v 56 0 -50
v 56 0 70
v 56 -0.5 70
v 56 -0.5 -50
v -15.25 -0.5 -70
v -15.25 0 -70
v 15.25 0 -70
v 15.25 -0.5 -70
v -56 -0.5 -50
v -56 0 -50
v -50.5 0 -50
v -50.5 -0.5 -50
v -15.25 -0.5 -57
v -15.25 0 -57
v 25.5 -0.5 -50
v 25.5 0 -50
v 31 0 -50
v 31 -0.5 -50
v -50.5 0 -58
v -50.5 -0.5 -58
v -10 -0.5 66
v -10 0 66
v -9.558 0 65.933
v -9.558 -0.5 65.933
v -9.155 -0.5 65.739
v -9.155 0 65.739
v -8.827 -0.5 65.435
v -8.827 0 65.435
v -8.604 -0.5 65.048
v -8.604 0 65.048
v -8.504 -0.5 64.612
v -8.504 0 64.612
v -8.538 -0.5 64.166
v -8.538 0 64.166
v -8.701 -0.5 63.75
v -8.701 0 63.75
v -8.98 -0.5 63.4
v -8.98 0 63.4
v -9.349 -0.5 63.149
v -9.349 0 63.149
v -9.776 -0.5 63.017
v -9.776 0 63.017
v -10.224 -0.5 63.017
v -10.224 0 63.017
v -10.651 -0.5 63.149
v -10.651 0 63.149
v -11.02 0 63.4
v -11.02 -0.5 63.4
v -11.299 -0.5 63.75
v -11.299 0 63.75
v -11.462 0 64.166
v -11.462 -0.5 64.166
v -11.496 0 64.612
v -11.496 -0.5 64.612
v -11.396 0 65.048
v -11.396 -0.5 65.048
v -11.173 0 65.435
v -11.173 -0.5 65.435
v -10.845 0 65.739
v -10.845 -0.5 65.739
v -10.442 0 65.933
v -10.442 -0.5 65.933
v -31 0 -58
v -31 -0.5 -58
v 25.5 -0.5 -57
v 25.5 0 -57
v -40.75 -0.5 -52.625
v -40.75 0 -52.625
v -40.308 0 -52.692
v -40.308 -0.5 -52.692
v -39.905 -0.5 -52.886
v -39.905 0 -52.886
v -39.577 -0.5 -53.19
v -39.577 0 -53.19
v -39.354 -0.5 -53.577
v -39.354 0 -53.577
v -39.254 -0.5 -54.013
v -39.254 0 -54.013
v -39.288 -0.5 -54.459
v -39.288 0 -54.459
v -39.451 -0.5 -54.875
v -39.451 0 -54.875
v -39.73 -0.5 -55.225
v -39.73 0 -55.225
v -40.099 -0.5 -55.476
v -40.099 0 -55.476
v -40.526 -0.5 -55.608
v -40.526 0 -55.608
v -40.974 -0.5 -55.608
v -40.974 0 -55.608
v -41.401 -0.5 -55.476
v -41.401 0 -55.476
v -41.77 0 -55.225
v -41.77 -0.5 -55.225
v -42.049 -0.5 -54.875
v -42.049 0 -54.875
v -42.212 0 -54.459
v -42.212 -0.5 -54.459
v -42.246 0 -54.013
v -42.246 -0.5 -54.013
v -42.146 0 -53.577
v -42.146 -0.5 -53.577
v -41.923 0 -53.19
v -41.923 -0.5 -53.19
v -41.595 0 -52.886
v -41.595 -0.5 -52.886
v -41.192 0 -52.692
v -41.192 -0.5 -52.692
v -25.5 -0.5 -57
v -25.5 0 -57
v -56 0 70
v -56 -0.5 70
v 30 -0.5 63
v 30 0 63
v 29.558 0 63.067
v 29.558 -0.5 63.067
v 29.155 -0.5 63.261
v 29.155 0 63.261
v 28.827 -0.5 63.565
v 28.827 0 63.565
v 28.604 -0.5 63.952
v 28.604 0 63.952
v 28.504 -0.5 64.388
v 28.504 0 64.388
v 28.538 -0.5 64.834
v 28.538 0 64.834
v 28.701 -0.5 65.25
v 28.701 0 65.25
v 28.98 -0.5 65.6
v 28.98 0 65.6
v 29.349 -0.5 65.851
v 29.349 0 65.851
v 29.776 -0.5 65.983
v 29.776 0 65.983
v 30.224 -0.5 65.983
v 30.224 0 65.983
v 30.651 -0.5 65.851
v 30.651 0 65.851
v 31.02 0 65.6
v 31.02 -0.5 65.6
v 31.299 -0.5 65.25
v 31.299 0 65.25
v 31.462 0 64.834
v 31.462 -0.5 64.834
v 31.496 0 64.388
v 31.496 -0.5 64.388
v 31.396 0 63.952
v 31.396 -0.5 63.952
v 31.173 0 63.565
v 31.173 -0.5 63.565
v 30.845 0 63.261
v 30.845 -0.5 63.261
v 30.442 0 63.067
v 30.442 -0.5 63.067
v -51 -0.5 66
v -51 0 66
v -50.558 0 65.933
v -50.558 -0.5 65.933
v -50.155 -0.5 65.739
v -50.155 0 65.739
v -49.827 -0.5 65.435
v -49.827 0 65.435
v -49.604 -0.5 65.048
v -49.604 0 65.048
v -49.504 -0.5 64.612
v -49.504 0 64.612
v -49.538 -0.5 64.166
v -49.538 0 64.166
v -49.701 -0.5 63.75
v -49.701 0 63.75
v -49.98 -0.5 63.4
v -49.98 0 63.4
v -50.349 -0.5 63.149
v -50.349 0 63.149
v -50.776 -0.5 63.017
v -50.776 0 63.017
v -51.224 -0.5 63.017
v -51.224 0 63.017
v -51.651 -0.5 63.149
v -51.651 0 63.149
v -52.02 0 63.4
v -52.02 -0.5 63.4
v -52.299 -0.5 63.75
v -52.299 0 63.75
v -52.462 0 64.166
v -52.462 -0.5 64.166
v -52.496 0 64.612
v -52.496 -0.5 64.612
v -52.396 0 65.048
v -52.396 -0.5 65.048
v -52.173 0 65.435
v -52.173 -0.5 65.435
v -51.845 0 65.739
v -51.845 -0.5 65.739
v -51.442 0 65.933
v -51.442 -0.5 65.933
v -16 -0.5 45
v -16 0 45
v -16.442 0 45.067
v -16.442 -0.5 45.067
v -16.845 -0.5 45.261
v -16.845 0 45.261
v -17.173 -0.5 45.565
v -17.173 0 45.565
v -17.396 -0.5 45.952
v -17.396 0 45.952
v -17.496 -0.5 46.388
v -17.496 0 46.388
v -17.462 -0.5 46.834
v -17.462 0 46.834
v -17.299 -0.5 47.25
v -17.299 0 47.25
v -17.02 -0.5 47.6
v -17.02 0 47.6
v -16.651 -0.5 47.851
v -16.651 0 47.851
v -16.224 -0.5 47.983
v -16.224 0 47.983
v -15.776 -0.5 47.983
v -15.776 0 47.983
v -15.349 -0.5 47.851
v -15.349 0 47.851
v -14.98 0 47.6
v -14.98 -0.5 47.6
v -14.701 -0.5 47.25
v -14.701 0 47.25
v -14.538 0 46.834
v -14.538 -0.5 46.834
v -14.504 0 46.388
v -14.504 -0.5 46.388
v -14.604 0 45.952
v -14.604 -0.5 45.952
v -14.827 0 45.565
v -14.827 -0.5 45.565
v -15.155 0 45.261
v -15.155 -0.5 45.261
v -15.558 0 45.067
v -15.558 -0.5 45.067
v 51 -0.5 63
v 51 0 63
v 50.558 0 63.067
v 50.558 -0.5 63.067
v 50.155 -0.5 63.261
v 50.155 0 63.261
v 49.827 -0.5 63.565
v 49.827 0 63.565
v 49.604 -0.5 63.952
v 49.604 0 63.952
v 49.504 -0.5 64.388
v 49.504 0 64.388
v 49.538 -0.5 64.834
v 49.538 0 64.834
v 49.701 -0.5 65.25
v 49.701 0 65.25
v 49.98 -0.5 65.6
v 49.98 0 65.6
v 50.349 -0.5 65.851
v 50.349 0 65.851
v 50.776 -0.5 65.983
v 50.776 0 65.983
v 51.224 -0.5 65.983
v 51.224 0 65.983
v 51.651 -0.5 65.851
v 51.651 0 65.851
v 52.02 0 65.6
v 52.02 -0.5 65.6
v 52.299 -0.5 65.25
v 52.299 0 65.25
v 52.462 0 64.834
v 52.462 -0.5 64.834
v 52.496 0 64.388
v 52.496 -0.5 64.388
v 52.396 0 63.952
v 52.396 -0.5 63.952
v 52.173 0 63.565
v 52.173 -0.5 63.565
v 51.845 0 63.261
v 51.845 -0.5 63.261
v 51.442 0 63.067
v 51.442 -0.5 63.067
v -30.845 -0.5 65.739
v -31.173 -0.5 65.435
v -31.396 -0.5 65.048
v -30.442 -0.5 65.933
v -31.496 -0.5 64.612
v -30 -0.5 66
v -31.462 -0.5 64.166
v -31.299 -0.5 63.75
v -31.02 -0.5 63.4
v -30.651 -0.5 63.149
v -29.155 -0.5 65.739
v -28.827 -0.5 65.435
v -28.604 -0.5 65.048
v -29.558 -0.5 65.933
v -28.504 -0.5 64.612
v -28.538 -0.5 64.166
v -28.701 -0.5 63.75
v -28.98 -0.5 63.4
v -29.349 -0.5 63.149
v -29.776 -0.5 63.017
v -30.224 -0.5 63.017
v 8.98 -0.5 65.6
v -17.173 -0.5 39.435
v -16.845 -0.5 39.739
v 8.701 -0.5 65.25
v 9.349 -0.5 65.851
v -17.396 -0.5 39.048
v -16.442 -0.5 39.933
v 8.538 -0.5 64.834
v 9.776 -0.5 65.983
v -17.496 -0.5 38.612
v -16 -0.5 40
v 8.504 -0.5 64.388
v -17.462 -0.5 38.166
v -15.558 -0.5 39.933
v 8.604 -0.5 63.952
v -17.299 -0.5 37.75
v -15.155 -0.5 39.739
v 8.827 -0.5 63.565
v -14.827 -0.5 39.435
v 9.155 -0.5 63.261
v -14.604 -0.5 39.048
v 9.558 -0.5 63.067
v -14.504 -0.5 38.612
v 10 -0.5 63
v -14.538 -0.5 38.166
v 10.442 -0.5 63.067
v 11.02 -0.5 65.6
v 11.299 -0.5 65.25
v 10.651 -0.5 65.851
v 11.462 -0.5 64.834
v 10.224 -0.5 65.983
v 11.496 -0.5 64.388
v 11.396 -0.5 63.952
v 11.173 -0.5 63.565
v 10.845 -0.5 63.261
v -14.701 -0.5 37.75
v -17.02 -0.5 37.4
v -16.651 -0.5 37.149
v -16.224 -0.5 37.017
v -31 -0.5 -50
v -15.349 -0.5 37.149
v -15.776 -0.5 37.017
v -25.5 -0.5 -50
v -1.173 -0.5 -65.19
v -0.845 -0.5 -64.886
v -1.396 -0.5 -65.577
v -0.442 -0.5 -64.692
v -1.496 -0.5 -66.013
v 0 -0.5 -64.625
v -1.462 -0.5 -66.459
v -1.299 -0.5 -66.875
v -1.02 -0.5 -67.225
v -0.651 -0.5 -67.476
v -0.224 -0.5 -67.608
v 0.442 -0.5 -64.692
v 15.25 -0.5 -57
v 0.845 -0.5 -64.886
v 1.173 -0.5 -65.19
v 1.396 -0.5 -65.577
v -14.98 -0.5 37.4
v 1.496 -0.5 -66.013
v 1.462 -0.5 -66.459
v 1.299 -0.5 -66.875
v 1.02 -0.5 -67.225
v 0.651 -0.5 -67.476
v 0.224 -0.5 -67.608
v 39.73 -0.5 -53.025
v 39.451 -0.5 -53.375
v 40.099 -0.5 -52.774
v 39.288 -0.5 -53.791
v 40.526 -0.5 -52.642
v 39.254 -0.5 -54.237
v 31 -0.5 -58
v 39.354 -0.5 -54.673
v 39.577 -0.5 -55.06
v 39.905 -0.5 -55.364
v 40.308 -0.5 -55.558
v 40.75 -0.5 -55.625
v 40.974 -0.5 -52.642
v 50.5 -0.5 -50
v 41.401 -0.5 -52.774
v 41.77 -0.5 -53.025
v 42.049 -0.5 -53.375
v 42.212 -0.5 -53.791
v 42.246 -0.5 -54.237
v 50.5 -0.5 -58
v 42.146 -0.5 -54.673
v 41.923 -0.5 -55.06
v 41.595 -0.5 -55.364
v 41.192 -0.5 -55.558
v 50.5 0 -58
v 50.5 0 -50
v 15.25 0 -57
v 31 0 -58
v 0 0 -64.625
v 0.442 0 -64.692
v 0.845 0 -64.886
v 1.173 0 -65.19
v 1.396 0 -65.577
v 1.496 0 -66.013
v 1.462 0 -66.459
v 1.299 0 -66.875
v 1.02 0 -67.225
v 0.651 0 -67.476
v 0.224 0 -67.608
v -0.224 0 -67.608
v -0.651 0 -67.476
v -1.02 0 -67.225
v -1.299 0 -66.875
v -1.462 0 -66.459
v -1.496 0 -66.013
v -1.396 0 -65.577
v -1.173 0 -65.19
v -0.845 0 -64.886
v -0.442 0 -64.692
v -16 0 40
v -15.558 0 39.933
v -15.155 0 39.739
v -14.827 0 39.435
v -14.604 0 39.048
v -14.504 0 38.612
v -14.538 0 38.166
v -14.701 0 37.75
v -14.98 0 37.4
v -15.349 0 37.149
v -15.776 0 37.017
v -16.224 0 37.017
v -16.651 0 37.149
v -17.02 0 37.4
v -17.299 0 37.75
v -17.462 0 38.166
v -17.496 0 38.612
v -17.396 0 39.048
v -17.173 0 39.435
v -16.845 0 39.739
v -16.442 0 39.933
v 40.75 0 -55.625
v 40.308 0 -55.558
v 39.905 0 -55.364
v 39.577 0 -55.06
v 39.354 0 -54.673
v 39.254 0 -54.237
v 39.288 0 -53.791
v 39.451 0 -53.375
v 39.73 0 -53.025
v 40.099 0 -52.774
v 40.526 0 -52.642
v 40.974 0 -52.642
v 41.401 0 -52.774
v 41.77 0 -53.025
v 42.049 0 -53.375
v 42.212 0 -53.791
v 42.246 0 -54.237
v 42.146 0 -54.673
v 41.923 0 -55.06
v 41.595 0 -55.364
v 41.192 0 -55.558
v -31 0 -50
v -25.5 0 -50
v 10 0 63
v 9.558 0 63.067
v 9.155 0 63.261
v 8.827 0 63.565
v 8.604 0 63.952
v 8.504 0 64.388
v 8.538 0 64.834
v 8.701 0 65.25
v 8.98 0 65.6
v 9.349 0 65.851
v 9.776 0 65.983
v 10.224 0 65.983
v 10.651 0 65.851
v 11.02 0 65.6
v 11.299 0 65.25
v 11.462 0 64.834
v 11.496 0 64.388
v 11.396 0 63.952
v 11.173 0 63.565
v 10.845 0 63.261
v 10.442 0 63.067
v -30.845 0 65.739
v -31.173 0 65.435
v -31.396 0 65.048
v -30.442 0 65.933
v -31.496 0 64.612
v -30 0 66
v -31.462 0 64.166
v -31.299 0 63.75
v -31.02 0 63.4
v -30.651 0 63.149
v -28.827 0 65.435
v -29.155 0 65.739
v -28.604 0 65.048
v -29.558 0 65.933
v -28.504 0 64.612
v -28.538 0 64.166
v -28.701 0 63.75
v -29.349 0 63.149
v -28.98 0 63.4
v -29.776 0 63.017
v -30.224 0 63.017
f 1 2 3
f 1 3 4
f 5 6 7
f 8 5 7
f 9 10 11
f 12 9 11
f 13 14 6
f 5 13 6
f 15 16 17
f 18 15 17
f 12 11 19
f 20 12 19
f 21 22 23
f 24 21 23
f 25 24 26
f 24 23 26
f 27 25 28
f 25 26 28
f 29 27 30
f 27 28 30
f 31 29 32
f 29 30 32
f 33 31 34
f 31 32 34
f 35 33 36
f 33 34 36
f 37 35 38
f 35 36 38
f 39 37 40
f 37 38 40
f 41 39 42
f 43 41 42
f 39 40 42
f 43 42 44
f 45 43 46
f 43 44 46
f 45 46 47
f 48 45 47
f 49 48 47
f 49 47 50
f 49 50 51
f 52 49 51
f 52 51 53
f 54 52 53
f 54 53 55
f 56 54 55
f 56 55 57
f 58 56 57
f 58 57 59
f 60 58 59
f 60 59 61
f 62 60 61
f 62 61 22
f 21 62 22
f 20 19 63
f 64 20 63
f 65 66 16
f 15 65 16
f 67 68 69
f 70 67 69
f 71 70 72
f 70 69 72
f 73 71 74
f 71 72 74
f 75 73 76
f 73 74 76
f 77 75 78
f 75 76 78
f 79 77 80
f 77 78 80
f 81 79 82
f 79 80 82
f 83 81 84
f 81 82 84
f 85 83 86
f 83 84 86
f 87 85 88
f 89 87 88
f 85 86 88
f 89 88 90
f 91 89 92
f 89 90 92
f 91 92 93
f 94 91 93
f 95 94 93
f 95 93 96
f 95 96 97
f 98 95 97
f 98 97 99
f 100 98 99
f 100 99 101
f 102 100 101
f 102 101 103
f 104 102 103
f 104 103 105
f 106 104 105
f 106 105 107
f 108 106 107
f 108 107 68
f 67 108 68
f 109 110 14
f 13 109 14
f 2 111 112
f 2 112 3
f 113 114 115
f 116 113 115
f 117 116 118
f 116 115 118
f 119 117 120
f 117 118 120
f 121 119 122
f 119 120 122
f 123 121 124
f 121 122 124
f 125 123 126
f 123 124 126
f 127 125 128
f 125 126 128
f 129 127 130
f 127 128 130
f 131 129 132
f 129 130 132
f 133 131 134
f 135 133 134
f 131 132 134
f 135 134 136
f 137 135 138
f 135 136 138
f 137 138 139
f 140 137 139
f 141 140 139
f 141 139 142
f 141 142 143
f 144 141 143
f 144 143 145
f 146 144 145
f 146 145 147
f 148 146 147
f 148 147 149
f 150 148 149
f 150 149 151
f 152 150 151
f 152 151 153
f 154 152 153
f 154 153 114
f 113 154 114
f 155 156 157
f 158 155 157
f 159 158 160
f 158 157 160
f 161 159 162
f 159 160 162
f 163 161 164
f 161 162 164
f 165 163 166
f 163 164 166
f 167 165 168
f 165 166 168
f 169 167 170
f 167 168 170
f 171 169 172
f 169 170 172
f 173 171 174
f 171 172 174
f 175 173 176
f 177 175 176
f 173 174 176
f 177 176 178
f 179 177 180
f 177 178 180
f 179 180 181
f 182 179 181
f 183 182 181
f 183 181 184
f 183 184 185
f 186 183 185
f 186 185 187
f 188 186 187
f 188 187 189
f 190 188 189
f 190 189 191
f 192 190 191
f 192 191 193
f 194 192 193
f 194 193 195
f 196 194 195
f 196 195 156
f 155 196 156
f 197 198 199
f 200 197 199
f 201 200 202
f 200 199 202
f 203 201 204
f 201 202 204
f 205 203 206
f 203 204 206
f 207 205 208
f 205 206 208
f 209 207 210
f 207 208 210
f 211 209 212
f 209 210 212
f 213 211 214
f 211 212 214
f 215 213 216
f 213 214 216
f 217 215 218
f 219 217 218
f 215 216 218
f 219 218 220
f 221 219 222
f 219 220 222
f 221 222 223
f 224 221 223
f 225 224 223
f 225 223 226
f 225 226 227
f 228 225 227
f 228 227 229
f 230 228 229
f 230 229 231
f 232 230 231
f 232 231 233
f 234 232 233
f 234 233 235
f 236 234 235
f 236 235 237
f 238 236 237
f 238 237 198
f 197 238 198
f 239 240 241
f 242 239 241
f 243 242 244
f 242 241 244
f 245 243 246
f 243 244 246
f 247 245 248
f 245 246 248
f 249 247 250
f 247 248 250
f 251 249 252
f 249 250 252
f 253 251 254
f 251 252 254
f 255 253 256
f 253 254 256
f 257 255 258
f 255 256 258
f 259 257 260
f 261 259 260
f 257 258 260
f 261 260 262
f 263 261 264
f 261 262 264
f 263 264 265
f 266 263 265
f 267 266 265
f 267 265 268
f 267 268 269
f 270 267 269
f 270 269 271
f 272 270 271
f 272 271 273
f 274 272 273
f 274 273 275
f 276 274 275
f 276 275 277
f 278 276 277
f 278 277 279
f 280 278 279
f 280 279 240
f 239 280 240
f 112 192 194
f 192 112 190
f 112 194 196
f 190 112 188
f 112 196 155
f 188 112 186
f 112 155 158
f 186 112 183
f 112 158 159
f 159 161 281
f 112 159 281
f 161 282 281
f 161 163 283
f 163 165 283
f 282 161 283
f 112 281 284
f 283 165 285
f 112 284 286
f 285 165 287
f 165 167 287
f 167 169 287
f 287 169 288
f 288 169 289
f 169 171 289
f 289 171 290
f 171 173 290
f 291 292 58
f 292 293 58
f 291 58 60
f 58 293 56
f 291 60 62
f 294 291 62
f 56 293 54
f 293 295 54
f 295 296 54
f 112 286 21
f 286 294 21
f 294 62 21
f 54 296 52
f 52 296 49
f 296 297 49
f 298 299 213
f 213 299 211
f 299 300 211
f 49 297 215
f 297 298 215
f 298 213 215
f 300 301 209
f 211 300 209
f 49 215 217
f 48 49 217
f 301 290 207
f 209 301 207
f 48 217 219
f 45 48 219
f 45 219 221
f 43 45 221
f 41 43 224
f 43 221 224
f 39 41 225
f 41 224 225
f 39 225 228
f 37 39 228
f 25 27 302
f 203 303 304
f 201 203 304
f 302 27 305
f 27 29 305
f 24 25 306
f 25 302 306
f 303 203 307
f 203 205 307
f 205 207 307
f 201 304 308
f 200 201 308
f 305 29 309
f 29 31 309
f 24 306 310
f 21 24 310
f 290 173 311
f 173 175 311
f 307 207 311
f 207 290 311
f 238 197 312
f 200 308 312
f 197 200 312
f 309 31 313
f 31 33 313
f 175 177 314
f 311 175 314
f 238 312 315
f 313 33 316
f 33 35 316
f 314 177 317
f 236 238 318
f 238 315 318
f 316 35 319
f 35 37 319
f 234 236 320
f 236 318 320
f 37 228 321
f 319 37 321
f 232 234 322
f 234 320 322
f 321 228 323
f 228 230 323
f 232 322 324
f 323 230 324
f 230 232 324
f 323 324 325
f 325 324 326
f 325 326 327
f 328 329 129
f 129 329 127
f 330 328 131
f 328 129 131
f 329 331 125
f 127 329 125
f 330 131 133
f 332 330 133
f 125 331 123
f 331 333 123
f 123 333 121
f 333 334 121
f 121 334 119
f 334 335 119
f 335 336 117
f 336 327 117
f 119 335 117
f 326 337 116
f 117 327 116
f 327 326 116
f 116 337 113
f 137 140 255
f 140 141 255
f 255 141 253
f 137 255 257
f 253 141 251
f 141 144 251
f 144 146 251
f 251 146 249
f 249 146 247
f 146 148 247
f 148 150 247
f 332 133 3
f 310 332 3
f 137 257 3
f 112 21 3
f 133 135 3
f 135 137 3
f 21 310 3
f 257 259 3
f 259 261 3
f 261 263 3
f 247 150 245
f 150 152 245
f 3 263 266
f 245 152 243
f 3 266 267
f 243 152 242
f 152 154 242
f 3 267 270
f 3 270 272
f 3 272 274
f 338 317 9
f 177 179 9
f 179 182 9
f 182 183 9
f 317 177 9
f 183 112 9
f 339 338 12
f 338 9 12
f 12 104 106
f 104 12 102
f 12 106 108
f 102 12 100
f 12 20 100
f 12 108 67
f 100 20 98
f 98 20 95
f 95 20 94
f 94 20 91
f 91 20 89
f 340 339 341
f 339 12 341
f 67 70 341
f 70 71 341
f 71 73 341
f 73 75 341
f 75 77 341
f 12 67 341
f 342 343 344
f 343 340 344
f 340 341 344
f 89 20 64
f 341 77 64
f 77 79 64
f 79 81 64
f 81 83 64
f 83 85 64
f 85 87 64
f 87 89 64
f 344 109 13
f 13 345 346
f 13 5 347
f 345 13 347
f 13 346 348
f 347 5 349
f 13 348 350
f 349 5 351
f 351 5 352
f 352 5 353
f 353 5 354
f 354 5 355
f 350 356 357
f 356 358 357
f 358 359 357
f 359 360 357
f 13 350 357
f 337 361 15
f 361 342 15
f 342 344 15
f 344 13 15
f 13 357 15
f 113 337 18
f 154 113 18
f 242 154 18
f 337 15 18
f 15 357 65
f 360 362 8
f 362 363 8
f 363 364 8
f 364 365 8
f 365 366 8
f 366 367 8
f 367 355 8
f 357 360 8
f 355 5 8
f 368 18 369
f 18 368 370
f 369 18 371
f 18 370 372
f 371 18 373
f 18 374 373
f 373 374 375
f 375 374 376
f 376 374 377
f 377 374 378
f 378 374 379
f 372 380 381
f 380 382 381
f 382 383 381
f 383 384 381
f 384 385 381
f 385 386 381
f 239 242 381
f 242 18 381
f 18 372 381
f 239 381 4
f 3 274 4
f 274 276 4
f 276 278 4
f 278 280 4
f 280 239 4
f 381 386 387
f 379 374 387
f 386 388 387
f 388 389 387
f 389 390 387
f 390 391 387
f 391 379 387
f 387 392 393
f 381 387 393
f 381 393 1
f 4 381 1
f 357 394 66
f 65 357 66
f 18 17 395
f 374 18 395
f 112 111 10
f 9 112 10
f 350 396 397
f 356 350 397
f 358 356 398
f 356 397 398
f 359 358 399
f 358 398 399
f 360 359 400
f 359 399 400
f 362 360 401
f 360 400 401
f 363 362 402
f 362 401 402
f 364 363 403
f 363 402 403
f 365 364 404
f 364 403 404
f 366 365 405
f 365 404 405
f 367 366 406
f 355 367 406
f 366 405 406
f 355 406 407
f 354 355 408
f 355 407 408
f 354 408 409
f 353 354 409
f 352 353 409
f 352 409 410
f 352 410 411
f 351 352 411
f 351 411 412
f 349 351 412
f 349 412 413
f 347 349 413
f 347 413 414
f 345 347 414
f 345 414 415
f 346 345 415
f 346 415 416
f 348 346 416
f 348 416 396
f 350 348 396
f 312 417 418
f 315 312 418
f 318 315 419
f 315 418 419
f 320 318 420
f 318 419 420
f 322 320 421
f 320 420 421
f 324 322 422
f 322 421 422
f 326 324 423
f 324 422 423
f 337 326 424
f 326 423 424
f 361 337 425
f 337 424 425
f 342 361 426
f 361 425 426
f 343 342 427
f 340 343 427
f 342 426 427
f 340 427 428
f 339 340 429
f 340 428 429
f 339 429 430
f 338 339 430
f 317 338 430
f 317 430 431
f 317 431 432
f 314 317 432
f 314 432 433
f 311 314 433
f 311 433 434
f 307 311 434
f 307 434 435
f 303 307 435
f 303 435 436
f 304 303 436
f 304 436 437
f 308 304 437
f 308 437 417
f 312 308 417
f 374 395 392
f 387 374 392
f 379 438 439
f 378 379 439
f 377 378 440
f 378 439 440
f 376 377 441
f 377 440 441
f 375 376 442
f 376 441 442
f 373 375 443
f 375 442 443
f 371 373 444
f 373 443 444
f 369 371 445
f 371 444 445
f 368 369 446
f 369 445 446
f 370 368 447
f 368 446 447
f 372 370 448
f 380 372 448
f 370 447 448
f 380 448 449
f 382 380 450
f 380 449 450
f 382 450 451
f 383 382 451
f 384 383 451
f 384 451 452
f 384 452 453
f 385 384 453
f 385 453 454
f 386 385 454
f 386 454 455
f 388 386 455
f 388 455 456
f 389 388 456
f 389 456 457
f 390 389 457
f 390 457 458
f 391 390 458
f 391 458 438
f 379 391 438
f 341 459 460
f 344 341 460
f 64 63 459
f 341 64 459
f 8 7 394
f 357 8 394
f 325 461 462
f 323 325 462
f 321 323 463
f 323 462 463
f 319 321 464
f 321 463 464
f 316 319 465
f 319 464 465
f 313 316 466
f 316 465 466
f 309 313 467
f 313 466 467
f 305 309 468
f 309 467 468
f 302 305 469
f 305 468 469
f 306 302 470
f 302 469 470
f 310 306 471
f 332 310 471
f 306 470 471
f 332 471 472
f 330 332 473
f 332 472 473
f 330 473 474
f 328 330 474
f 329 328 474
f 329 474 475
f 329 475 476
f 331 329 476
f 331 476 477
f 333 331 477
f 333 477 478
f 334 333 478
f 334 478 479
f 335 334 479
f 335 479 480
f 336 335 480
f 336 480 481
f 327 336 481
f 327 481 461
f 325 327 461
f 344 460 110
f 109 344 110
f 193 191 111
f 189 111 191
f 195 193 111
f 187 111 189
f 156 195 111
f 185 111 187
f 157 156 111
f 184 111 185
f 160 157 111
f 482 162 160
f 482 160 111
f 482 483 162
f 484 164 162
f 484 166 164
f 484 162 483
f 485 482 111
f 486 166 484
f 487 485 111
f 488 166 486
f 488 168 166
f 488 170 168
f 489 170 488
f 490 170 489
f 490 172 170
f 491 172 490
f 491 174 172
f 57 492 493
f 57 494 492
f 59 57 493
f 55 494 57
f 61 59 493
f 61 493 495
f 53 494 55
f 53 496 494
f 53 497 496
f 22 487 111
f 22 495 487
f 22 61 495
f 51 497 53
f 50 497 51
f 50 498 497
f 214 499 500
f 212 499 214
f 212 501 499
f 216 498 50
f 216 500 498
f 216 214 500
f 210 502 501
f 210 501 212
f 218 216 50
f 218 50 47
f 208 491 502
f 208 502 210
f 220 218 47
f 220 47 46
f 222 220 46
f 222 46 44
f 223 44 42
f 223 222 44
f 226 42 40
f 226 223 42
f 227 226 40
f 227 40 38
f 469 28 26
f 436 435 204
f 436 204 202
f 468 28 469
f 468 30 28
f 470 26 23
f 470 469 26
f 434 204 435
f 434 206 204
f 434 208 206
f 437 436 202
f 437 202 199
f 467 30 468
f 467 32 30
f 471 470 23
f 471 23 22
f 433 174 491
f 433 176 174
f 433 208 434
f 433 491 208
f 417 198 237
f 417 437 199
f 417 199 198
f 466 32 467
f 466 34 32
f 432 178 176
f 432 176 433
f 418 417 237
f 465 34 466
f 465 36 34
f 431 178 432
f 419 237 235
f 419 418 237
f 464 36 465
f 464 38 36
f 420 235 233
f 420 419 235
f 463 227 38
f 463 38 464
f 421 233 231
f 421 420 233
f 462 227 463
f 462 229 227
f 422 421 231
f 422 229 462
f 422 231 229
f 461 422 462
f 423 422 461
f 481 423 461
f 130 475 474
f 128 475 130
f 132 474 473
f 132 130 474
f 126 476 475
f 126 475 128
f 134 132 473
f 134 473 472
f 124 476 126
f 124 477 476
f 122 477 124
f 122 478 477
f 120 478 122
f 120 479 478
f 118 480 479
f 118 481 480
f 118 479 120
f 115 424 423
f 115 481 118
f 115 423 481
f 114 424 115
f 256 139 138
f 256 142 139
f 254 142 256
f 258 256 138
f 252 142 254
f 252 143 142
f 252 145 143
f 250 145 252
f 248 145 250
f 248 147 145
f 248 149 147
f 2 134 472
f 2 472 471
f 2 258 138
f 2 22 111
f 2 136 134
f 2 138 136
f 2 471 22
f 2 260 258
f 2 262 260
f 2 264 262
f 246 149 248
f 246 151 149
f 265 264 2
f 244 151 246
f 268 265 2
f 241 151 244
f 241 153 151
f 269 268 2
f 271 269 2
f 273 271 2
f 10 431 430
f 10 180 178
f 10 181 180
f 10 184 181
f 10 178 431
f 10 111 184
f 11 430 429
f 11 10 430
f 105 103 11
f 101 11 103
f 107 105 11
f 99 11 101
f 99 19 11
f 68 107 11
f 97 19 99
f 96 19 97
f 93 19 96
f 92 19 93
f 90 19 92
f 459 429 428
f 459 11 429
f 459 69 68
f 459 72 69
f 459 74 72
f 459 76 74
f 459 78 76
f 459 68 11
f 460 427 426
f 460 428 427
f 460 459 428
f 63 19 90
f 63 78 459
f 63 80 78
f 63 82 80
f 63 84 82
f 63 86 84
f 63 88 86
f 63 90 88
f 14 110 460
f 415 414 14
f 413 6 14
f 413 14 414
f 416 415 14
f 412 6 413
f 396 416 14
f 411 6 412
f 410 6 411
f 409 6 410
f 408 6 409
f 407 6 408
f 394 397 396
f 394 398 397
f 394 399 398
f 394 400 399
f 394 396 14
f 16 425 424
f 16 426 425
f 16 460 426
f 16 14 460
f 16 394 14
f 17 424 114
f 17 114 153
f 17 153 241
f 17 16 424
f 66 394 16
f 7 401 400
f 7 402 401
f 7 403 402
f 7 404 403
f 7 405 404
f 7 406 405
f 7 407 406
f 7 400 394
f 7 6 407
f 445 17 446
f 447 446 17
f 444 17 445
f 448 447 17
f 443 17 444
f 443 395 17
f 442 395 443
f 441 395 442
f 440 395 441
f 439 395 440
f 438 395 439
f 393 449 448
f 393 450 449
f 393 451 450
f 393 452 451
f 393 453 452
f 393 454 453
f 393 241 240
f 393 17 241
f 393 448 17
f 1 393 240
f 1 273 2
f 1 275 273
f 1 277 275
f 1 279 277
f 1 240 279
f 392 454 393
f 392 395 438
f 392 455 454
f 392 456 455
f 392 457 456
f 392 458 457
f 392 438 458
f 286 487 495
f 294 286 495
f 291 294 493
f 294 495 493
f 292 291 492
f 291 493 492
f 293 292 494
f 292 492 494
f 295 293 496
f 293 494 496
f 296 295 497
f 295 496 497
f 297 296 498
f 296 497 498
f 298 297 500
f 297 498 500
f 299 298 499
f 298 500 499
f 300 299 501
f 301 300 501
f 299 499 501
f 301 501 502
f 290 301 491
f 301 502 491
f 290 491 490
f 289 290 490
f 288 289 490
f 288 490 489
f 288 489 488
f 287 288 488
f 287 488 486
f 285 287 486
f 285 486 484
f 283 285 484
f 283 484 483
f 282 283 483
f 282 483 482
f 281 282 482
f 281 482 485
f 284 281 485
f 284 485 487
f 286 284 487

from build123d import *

# Parameters (mm, degrees)
CROQUIS1_W            = 112
CROQUIS1_H            = 140
BRIDA_BASE1_DEPTH     = 0.5
CORTAR_EXTRUIR1_DEPTH = 10
CROQUIS6_R            = 1.5
CORTAR_EXTRUIR2_DEPTH = 10
CROQUIS7_R            = 1.5
CORTAR_EXTRUIR3_DEPTH = 10


# Sheet-metal steps are written as plain solids
with BuildPart() as part:
    # Croquis1 → Brida base1 (new body)
    with BuildSketch(Plane(origin=(0, 0, 0), x_dir=(1, 0, 0), z_dir=(0, 1, 0))):
        Rectangle(CROQUIS1_W, CROQUIS1_H)
    extrude(amount=-BRIDA_BASE1_DEPTH)

    # Croquis5 → Cortar-Extruir1 (cut)
    with BuildSketch(Plane(origin=(0, 0, 0), x_dir=(1, 0, 0), z_dir=(0, 1, 0))):
        Polygon((-15.25, 57), (-15.25, 70), (-56, 70), (-56, 50), (-50.5, 50), (-50.5, 58), (-31, 58), (-31, 50), (-25.5, 50), (-25.5, 57), align=None)
        Polygon((56, 70), (15.25, 70), (15.25, 57), (25.5, 57), (25.5, 50), (31, 50), (31, 58), (50.5, 58), (50.5, 50), (56, 50), align=None)
    extrude(amount=-CORTAR_EXTRUIR1_DEPTH, mode=Mode.SUBTRACT)

    # Croquis6 → Cortar-Extruir2 (cut)
    with BuildSketch(Plane(origin=(0, 0, 0), x_dir=(1, 0, 0), z_dir=(0, 1, 0))):
        with Locations(Location((-40.75, 54.125, 0), (0, 0, 270))):
            Circle(CROQUIS6_R)
        with Locations(Location((0, 66.125, 0), (0, 0, 270))):
            Circle(CROQUIS6_R)
        with Locations(Location((40.75, 54.125, 0), (0, 0, 90))):
            Circle(CROQUIS6_R)
    extrude(amount=-CORTAR_EXTRUIR2_DEPTH, mode=Mode.SUBTRACT)

    # Croquis7 → Cortar-Extruir3 (cut)
    with BuildSketch(Plane(origin=(0, 0, 0), x_dir=(1, 0, 0), z_dir=(0, 1, 0))):
        with Locations(Location((-16, -38.5, 0), (0, 0, 270))):
            Circle(CROQUIS7_R)
        with Locations(Location((-16, -46.5, 0), (0, 0, 90))):
            Circle(CROQUIS7_R)
        with Locations(Location((-10, -64.5, 0), (0, 0, 270))):
            Circle(CROQUIS7_R)
        with Locations(Location((-30, -64.5, 0), (0, 0, 270))):
            Circle(CROQUIS7_R)
        with Locations(Location((30, -64.5, 0), (0, 0, 90))):
            Circle(CROQUIS7_R)
        with Locations(Location((10, -64.5, 0), (0, 0, 90))):
            Circle(CROQUIS7_R)
        with Locations(Location((-51, -64.5, 0), (0, 0, 270))):
            Circle(CROQUIS7_R)
        with Locations(Location((51, -64.5, 0), (0, 0, 90))):
            Circle(CROQUIS7_R)
    extrude(amount=-CORTAR_EXTRUIR3_DEPTH, mode=Mode.SUBTRACT)


solid = part.part
